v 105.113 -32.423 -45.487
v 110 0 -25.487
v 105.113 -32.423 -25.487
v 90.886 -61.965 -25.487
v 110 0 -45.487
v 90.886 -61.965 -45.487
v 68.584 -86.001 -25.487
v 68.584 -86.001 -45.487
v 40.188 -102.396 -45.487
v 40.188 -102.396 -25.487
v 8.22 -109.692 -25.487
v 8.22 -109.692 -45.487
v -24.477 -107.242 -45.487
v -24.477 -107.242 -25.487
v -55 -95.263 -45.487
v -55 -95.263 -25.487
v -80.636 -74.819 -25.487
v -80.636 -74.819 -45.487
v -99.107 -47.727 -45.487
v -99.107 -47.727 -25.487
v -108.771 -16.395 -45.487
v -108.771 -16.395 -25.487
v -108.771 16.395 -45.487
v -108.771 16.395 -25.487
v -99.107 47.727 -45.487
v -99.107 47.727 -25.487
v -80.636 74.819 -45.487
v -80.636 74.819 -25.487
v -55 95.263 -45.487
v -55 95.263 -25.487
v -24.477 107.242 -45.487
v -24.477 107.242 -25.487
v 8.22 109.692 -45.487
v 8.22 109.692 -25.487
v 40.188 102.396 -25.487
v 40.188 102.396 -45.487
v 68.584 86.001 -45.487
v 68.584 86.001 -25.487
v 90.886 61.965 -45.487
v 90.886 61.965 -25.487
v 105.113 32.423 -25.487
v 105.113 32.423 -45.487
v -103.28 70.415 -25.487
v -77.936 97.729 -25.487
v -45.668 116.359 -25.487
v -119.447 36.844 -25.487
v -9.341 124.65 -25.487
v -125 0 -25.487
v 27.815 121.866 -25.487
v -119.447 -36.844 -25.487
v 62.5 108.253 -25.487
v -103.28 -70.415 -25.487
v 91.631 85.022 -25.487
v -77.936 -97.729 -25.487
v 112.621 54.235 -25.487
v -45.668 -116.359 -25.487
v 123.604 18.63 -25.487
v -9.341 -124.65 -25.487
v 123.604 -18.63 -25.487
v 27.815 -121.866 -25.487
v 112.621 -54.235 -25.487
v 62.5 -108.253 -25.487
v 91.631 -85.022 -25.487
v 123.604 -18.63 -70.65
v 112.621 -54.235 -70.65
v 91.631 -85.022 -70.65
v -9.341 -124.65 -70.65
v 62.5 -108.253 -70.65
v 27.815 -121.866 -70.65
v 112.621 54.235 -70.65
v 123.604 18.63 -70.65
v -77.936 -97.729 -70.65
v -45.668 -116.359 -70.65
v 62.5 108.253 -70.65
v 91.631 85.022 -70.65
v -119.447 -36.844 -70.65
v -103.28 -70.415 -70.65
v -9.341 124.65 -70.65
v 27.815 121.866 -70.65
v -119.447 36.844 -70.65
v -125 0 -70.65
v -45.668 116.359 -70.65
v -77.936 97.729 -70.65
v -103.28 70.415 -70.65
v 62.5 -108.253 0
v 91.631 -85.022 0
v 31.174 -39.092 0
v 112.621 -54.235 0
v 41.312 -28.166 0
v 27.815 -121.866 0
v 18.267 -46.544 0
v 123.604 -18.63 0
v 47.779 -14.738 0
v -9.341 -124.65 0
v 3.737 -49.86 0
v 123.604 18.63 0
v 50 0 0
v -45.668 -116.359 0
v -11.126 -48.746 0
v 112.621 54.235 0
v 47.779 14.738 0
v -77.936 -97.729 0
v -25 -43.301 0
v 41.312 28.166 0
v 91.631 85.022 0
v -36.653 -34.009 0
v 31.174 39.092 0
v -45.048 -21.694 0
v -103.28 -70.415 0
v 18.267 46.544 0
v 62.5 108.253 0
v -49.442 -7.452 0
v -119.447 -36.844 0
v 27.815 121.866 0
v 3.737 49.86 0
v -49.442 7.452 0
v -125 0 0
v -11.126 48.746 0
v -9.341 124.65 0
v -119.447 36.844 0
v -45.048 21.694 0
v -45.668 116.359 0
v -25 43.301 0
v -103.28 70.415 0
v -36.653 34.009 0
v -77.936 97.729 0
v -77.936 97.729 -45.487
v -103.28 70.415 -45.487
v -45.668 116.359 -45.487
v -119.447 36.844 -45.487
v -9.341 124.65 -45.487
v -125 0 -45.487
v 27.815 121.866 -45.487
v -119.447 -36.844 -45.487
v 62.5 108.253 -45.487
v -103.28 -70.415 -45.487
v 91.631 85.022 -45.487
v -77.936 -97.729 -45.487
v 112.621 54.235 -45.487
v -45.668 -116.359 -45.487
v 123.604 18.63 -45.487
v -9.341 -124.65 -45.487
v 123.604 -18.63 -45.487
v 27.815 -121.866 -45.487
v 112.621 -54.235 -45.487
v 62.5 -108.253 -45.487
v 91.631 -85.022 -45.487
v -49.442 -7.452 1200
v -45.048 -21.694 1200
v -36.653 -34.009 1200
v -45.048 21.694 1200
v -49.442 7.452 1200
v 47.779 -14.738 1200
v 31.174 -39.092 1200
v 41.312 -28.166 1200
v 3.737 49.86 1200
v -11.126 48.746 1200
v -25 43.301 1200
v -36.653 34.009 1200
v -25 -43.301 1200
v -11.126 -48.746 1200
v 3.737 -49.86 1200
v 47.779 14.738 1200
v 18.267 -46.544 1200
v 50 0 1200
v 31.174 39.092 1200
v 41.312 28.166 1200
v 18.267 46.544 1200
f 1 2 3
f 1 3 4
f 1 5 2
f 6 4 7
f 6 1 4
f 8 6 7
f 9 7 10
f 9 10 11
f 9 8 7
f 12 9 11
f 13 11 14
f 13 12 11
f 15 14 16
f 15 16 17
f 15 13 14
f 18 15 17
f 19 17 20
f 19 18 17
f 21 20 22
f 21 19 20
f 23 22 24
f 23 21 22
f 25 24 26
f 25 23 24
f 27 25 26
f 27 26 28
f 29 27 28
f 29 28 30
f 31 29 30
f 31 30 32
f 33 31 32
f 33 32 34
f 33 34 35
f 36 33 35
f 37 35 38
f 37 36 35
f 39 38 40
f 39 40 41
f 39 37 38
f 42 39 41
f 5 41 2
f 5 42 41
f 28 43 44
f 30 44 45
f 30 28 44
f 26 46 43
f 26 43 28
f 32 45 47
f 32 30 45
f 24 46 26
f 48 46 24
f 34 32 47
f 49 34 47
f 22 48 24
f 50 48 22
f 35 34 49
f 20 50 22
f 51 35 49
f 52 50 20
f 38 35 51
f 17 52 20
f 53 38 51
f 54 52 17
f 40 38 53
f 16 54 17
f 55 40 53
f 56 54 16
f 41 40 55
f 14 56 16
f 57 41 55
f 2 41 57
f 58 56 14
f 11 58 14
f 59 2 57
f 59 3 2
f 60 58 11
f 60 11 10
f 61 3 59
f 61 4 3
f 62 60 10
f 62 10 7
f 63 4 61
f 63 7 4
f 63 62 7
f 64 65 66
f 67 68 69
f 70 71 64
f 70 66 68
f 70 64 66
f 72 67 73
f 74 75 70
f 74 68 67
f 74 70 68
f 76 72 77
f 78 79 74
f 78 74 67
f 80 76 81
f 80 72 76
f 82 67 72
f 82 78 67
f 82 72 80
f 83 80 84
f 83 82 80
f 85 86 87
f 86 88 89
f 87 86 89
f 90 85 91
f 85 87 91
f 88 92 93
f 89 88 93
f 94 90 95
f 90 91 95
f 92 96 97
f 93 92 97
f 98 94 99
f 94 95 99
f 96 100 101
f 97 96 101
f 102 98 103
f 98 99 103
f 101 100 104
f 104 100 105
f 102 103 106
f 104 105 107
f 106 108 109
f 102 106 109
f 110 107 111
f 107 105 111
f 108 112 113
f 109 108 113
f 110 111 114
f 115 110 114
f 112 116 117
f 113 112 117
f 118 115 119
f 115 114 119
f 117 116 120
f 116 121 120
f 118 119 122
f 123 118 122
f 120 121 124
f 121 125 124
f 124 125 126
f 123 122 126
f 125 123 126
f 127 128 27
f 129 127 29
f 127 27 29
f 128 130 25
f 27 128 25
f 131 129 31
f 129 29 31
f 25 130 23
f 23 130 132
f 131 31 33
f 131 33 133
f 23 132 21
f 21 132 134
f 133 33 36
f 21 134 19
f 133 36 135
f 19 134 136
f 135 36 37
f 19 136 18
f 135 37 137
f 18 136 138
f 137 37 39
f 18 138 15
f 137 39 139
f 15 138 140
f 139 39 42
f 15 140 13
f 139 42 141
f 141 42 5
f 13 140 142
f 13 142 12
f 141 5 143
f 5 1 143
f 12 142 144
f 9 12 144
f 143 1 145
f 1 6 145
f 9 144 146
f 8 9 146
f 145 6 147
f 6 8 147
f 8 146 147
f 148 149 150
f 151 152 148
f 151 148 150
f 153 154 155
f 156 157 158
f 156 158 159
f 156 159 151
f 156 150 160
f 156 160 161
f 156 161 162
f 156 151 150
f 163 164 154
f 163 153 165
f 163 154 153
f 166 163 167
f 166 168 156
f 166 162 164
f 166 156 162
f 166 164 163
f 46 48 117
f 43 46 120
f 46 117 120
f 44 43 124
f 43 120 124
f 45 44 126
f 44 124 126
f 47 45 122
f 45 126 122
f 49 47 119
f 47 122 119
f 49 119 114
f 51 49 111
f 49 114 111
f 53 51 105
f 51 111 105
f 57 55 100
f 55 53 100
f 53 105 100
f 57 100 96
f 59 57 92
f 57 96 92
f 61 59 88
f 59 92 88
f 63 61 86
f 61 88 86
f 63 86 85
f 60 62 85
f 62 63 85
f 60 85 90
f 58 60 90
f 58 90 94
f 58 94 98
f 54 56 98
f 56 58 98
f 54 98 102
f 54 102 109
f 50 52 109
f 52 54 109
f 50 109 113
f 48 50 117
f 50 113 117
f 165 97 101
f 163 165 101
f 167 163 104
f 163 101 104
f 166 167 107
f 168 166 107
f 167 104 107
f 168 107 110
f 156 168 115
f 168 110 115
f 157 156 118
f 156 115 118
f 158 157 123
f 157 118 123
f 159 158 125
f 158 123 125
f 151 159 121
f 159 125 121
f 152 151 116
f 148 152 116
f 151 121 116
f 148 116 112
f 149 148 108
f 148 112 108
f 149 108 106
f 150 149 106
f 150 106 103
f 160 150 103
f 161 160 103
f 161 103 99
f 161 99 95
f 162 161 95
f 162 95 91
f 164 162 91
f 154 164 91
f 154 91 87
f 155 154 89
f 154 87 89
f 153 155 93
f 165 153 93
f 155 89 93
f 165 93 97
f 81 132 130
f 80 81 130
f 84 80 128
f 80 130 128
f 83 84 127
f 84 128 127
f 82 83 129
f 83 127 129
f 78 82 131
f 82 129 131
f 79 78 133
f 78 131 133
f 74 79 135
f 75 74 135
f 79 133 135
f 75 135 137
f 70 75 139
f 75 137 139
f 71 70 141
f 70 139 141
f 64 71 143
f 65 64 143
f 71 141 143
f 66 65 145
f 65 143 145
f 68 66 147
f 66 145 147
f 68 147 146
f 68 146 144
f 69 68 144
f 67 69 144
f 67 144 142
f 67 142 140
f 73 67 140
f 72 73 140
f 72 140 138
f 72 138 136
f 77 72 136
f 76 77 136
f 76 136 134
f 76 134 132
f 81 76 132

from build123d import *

# Parameters (mm, degrees)
SKETCH1_R           = 50
BOSS_EXTRUDE1_DEPTH = 1200
SKETCH2_R           = 125
BOSS_EXTRUDE2_DEPTH = 70.65
SKETCH5_W           = 15
SKETCH5_H           = 20


with BuildPart() as part:
    # Sketch1 → Boss-Extrude1 (new body)
    with BuildSketch(Plane.XY):
        Circle(SKETCH1_R)
    extrude(amount=BOSS_EXTRUDE1_DEPTH)

    # Sketch2 → Boss-Extrude2 (add)
    with BuildSketch(Plane(origin=(0, 0, 0), x_dir=(-1, 0, 0), z_dir=(0, 0, -1))):
        Circle(SKETCH2_R)
    extrude(amount=BOSS_EXTRUDE2_DEPTH)

    # Sketch5 → Cut-Revolve1 (revolve, cut)
    with BuildSketch(Plane(origin=(0, 0, 0), x_dir=(1, 0, 0), z_dir=(0, 1, 0)), mode=Mode.PRIVATE) as cut_revolve1_sk:
        with Locations((-117.5, 35.486594565)):
            Rectangle(SKETCH5_W, SKETCH5_H)
    revolve(cut_revolve1_sk.sketch.rotate(Axis((0, 0, 1200), (0, 0, -1)), 180), axis=Axis((0, 0, 1200), (0, 0, -1)), mode=Mode.SUBTRACT)


solid = part.part
